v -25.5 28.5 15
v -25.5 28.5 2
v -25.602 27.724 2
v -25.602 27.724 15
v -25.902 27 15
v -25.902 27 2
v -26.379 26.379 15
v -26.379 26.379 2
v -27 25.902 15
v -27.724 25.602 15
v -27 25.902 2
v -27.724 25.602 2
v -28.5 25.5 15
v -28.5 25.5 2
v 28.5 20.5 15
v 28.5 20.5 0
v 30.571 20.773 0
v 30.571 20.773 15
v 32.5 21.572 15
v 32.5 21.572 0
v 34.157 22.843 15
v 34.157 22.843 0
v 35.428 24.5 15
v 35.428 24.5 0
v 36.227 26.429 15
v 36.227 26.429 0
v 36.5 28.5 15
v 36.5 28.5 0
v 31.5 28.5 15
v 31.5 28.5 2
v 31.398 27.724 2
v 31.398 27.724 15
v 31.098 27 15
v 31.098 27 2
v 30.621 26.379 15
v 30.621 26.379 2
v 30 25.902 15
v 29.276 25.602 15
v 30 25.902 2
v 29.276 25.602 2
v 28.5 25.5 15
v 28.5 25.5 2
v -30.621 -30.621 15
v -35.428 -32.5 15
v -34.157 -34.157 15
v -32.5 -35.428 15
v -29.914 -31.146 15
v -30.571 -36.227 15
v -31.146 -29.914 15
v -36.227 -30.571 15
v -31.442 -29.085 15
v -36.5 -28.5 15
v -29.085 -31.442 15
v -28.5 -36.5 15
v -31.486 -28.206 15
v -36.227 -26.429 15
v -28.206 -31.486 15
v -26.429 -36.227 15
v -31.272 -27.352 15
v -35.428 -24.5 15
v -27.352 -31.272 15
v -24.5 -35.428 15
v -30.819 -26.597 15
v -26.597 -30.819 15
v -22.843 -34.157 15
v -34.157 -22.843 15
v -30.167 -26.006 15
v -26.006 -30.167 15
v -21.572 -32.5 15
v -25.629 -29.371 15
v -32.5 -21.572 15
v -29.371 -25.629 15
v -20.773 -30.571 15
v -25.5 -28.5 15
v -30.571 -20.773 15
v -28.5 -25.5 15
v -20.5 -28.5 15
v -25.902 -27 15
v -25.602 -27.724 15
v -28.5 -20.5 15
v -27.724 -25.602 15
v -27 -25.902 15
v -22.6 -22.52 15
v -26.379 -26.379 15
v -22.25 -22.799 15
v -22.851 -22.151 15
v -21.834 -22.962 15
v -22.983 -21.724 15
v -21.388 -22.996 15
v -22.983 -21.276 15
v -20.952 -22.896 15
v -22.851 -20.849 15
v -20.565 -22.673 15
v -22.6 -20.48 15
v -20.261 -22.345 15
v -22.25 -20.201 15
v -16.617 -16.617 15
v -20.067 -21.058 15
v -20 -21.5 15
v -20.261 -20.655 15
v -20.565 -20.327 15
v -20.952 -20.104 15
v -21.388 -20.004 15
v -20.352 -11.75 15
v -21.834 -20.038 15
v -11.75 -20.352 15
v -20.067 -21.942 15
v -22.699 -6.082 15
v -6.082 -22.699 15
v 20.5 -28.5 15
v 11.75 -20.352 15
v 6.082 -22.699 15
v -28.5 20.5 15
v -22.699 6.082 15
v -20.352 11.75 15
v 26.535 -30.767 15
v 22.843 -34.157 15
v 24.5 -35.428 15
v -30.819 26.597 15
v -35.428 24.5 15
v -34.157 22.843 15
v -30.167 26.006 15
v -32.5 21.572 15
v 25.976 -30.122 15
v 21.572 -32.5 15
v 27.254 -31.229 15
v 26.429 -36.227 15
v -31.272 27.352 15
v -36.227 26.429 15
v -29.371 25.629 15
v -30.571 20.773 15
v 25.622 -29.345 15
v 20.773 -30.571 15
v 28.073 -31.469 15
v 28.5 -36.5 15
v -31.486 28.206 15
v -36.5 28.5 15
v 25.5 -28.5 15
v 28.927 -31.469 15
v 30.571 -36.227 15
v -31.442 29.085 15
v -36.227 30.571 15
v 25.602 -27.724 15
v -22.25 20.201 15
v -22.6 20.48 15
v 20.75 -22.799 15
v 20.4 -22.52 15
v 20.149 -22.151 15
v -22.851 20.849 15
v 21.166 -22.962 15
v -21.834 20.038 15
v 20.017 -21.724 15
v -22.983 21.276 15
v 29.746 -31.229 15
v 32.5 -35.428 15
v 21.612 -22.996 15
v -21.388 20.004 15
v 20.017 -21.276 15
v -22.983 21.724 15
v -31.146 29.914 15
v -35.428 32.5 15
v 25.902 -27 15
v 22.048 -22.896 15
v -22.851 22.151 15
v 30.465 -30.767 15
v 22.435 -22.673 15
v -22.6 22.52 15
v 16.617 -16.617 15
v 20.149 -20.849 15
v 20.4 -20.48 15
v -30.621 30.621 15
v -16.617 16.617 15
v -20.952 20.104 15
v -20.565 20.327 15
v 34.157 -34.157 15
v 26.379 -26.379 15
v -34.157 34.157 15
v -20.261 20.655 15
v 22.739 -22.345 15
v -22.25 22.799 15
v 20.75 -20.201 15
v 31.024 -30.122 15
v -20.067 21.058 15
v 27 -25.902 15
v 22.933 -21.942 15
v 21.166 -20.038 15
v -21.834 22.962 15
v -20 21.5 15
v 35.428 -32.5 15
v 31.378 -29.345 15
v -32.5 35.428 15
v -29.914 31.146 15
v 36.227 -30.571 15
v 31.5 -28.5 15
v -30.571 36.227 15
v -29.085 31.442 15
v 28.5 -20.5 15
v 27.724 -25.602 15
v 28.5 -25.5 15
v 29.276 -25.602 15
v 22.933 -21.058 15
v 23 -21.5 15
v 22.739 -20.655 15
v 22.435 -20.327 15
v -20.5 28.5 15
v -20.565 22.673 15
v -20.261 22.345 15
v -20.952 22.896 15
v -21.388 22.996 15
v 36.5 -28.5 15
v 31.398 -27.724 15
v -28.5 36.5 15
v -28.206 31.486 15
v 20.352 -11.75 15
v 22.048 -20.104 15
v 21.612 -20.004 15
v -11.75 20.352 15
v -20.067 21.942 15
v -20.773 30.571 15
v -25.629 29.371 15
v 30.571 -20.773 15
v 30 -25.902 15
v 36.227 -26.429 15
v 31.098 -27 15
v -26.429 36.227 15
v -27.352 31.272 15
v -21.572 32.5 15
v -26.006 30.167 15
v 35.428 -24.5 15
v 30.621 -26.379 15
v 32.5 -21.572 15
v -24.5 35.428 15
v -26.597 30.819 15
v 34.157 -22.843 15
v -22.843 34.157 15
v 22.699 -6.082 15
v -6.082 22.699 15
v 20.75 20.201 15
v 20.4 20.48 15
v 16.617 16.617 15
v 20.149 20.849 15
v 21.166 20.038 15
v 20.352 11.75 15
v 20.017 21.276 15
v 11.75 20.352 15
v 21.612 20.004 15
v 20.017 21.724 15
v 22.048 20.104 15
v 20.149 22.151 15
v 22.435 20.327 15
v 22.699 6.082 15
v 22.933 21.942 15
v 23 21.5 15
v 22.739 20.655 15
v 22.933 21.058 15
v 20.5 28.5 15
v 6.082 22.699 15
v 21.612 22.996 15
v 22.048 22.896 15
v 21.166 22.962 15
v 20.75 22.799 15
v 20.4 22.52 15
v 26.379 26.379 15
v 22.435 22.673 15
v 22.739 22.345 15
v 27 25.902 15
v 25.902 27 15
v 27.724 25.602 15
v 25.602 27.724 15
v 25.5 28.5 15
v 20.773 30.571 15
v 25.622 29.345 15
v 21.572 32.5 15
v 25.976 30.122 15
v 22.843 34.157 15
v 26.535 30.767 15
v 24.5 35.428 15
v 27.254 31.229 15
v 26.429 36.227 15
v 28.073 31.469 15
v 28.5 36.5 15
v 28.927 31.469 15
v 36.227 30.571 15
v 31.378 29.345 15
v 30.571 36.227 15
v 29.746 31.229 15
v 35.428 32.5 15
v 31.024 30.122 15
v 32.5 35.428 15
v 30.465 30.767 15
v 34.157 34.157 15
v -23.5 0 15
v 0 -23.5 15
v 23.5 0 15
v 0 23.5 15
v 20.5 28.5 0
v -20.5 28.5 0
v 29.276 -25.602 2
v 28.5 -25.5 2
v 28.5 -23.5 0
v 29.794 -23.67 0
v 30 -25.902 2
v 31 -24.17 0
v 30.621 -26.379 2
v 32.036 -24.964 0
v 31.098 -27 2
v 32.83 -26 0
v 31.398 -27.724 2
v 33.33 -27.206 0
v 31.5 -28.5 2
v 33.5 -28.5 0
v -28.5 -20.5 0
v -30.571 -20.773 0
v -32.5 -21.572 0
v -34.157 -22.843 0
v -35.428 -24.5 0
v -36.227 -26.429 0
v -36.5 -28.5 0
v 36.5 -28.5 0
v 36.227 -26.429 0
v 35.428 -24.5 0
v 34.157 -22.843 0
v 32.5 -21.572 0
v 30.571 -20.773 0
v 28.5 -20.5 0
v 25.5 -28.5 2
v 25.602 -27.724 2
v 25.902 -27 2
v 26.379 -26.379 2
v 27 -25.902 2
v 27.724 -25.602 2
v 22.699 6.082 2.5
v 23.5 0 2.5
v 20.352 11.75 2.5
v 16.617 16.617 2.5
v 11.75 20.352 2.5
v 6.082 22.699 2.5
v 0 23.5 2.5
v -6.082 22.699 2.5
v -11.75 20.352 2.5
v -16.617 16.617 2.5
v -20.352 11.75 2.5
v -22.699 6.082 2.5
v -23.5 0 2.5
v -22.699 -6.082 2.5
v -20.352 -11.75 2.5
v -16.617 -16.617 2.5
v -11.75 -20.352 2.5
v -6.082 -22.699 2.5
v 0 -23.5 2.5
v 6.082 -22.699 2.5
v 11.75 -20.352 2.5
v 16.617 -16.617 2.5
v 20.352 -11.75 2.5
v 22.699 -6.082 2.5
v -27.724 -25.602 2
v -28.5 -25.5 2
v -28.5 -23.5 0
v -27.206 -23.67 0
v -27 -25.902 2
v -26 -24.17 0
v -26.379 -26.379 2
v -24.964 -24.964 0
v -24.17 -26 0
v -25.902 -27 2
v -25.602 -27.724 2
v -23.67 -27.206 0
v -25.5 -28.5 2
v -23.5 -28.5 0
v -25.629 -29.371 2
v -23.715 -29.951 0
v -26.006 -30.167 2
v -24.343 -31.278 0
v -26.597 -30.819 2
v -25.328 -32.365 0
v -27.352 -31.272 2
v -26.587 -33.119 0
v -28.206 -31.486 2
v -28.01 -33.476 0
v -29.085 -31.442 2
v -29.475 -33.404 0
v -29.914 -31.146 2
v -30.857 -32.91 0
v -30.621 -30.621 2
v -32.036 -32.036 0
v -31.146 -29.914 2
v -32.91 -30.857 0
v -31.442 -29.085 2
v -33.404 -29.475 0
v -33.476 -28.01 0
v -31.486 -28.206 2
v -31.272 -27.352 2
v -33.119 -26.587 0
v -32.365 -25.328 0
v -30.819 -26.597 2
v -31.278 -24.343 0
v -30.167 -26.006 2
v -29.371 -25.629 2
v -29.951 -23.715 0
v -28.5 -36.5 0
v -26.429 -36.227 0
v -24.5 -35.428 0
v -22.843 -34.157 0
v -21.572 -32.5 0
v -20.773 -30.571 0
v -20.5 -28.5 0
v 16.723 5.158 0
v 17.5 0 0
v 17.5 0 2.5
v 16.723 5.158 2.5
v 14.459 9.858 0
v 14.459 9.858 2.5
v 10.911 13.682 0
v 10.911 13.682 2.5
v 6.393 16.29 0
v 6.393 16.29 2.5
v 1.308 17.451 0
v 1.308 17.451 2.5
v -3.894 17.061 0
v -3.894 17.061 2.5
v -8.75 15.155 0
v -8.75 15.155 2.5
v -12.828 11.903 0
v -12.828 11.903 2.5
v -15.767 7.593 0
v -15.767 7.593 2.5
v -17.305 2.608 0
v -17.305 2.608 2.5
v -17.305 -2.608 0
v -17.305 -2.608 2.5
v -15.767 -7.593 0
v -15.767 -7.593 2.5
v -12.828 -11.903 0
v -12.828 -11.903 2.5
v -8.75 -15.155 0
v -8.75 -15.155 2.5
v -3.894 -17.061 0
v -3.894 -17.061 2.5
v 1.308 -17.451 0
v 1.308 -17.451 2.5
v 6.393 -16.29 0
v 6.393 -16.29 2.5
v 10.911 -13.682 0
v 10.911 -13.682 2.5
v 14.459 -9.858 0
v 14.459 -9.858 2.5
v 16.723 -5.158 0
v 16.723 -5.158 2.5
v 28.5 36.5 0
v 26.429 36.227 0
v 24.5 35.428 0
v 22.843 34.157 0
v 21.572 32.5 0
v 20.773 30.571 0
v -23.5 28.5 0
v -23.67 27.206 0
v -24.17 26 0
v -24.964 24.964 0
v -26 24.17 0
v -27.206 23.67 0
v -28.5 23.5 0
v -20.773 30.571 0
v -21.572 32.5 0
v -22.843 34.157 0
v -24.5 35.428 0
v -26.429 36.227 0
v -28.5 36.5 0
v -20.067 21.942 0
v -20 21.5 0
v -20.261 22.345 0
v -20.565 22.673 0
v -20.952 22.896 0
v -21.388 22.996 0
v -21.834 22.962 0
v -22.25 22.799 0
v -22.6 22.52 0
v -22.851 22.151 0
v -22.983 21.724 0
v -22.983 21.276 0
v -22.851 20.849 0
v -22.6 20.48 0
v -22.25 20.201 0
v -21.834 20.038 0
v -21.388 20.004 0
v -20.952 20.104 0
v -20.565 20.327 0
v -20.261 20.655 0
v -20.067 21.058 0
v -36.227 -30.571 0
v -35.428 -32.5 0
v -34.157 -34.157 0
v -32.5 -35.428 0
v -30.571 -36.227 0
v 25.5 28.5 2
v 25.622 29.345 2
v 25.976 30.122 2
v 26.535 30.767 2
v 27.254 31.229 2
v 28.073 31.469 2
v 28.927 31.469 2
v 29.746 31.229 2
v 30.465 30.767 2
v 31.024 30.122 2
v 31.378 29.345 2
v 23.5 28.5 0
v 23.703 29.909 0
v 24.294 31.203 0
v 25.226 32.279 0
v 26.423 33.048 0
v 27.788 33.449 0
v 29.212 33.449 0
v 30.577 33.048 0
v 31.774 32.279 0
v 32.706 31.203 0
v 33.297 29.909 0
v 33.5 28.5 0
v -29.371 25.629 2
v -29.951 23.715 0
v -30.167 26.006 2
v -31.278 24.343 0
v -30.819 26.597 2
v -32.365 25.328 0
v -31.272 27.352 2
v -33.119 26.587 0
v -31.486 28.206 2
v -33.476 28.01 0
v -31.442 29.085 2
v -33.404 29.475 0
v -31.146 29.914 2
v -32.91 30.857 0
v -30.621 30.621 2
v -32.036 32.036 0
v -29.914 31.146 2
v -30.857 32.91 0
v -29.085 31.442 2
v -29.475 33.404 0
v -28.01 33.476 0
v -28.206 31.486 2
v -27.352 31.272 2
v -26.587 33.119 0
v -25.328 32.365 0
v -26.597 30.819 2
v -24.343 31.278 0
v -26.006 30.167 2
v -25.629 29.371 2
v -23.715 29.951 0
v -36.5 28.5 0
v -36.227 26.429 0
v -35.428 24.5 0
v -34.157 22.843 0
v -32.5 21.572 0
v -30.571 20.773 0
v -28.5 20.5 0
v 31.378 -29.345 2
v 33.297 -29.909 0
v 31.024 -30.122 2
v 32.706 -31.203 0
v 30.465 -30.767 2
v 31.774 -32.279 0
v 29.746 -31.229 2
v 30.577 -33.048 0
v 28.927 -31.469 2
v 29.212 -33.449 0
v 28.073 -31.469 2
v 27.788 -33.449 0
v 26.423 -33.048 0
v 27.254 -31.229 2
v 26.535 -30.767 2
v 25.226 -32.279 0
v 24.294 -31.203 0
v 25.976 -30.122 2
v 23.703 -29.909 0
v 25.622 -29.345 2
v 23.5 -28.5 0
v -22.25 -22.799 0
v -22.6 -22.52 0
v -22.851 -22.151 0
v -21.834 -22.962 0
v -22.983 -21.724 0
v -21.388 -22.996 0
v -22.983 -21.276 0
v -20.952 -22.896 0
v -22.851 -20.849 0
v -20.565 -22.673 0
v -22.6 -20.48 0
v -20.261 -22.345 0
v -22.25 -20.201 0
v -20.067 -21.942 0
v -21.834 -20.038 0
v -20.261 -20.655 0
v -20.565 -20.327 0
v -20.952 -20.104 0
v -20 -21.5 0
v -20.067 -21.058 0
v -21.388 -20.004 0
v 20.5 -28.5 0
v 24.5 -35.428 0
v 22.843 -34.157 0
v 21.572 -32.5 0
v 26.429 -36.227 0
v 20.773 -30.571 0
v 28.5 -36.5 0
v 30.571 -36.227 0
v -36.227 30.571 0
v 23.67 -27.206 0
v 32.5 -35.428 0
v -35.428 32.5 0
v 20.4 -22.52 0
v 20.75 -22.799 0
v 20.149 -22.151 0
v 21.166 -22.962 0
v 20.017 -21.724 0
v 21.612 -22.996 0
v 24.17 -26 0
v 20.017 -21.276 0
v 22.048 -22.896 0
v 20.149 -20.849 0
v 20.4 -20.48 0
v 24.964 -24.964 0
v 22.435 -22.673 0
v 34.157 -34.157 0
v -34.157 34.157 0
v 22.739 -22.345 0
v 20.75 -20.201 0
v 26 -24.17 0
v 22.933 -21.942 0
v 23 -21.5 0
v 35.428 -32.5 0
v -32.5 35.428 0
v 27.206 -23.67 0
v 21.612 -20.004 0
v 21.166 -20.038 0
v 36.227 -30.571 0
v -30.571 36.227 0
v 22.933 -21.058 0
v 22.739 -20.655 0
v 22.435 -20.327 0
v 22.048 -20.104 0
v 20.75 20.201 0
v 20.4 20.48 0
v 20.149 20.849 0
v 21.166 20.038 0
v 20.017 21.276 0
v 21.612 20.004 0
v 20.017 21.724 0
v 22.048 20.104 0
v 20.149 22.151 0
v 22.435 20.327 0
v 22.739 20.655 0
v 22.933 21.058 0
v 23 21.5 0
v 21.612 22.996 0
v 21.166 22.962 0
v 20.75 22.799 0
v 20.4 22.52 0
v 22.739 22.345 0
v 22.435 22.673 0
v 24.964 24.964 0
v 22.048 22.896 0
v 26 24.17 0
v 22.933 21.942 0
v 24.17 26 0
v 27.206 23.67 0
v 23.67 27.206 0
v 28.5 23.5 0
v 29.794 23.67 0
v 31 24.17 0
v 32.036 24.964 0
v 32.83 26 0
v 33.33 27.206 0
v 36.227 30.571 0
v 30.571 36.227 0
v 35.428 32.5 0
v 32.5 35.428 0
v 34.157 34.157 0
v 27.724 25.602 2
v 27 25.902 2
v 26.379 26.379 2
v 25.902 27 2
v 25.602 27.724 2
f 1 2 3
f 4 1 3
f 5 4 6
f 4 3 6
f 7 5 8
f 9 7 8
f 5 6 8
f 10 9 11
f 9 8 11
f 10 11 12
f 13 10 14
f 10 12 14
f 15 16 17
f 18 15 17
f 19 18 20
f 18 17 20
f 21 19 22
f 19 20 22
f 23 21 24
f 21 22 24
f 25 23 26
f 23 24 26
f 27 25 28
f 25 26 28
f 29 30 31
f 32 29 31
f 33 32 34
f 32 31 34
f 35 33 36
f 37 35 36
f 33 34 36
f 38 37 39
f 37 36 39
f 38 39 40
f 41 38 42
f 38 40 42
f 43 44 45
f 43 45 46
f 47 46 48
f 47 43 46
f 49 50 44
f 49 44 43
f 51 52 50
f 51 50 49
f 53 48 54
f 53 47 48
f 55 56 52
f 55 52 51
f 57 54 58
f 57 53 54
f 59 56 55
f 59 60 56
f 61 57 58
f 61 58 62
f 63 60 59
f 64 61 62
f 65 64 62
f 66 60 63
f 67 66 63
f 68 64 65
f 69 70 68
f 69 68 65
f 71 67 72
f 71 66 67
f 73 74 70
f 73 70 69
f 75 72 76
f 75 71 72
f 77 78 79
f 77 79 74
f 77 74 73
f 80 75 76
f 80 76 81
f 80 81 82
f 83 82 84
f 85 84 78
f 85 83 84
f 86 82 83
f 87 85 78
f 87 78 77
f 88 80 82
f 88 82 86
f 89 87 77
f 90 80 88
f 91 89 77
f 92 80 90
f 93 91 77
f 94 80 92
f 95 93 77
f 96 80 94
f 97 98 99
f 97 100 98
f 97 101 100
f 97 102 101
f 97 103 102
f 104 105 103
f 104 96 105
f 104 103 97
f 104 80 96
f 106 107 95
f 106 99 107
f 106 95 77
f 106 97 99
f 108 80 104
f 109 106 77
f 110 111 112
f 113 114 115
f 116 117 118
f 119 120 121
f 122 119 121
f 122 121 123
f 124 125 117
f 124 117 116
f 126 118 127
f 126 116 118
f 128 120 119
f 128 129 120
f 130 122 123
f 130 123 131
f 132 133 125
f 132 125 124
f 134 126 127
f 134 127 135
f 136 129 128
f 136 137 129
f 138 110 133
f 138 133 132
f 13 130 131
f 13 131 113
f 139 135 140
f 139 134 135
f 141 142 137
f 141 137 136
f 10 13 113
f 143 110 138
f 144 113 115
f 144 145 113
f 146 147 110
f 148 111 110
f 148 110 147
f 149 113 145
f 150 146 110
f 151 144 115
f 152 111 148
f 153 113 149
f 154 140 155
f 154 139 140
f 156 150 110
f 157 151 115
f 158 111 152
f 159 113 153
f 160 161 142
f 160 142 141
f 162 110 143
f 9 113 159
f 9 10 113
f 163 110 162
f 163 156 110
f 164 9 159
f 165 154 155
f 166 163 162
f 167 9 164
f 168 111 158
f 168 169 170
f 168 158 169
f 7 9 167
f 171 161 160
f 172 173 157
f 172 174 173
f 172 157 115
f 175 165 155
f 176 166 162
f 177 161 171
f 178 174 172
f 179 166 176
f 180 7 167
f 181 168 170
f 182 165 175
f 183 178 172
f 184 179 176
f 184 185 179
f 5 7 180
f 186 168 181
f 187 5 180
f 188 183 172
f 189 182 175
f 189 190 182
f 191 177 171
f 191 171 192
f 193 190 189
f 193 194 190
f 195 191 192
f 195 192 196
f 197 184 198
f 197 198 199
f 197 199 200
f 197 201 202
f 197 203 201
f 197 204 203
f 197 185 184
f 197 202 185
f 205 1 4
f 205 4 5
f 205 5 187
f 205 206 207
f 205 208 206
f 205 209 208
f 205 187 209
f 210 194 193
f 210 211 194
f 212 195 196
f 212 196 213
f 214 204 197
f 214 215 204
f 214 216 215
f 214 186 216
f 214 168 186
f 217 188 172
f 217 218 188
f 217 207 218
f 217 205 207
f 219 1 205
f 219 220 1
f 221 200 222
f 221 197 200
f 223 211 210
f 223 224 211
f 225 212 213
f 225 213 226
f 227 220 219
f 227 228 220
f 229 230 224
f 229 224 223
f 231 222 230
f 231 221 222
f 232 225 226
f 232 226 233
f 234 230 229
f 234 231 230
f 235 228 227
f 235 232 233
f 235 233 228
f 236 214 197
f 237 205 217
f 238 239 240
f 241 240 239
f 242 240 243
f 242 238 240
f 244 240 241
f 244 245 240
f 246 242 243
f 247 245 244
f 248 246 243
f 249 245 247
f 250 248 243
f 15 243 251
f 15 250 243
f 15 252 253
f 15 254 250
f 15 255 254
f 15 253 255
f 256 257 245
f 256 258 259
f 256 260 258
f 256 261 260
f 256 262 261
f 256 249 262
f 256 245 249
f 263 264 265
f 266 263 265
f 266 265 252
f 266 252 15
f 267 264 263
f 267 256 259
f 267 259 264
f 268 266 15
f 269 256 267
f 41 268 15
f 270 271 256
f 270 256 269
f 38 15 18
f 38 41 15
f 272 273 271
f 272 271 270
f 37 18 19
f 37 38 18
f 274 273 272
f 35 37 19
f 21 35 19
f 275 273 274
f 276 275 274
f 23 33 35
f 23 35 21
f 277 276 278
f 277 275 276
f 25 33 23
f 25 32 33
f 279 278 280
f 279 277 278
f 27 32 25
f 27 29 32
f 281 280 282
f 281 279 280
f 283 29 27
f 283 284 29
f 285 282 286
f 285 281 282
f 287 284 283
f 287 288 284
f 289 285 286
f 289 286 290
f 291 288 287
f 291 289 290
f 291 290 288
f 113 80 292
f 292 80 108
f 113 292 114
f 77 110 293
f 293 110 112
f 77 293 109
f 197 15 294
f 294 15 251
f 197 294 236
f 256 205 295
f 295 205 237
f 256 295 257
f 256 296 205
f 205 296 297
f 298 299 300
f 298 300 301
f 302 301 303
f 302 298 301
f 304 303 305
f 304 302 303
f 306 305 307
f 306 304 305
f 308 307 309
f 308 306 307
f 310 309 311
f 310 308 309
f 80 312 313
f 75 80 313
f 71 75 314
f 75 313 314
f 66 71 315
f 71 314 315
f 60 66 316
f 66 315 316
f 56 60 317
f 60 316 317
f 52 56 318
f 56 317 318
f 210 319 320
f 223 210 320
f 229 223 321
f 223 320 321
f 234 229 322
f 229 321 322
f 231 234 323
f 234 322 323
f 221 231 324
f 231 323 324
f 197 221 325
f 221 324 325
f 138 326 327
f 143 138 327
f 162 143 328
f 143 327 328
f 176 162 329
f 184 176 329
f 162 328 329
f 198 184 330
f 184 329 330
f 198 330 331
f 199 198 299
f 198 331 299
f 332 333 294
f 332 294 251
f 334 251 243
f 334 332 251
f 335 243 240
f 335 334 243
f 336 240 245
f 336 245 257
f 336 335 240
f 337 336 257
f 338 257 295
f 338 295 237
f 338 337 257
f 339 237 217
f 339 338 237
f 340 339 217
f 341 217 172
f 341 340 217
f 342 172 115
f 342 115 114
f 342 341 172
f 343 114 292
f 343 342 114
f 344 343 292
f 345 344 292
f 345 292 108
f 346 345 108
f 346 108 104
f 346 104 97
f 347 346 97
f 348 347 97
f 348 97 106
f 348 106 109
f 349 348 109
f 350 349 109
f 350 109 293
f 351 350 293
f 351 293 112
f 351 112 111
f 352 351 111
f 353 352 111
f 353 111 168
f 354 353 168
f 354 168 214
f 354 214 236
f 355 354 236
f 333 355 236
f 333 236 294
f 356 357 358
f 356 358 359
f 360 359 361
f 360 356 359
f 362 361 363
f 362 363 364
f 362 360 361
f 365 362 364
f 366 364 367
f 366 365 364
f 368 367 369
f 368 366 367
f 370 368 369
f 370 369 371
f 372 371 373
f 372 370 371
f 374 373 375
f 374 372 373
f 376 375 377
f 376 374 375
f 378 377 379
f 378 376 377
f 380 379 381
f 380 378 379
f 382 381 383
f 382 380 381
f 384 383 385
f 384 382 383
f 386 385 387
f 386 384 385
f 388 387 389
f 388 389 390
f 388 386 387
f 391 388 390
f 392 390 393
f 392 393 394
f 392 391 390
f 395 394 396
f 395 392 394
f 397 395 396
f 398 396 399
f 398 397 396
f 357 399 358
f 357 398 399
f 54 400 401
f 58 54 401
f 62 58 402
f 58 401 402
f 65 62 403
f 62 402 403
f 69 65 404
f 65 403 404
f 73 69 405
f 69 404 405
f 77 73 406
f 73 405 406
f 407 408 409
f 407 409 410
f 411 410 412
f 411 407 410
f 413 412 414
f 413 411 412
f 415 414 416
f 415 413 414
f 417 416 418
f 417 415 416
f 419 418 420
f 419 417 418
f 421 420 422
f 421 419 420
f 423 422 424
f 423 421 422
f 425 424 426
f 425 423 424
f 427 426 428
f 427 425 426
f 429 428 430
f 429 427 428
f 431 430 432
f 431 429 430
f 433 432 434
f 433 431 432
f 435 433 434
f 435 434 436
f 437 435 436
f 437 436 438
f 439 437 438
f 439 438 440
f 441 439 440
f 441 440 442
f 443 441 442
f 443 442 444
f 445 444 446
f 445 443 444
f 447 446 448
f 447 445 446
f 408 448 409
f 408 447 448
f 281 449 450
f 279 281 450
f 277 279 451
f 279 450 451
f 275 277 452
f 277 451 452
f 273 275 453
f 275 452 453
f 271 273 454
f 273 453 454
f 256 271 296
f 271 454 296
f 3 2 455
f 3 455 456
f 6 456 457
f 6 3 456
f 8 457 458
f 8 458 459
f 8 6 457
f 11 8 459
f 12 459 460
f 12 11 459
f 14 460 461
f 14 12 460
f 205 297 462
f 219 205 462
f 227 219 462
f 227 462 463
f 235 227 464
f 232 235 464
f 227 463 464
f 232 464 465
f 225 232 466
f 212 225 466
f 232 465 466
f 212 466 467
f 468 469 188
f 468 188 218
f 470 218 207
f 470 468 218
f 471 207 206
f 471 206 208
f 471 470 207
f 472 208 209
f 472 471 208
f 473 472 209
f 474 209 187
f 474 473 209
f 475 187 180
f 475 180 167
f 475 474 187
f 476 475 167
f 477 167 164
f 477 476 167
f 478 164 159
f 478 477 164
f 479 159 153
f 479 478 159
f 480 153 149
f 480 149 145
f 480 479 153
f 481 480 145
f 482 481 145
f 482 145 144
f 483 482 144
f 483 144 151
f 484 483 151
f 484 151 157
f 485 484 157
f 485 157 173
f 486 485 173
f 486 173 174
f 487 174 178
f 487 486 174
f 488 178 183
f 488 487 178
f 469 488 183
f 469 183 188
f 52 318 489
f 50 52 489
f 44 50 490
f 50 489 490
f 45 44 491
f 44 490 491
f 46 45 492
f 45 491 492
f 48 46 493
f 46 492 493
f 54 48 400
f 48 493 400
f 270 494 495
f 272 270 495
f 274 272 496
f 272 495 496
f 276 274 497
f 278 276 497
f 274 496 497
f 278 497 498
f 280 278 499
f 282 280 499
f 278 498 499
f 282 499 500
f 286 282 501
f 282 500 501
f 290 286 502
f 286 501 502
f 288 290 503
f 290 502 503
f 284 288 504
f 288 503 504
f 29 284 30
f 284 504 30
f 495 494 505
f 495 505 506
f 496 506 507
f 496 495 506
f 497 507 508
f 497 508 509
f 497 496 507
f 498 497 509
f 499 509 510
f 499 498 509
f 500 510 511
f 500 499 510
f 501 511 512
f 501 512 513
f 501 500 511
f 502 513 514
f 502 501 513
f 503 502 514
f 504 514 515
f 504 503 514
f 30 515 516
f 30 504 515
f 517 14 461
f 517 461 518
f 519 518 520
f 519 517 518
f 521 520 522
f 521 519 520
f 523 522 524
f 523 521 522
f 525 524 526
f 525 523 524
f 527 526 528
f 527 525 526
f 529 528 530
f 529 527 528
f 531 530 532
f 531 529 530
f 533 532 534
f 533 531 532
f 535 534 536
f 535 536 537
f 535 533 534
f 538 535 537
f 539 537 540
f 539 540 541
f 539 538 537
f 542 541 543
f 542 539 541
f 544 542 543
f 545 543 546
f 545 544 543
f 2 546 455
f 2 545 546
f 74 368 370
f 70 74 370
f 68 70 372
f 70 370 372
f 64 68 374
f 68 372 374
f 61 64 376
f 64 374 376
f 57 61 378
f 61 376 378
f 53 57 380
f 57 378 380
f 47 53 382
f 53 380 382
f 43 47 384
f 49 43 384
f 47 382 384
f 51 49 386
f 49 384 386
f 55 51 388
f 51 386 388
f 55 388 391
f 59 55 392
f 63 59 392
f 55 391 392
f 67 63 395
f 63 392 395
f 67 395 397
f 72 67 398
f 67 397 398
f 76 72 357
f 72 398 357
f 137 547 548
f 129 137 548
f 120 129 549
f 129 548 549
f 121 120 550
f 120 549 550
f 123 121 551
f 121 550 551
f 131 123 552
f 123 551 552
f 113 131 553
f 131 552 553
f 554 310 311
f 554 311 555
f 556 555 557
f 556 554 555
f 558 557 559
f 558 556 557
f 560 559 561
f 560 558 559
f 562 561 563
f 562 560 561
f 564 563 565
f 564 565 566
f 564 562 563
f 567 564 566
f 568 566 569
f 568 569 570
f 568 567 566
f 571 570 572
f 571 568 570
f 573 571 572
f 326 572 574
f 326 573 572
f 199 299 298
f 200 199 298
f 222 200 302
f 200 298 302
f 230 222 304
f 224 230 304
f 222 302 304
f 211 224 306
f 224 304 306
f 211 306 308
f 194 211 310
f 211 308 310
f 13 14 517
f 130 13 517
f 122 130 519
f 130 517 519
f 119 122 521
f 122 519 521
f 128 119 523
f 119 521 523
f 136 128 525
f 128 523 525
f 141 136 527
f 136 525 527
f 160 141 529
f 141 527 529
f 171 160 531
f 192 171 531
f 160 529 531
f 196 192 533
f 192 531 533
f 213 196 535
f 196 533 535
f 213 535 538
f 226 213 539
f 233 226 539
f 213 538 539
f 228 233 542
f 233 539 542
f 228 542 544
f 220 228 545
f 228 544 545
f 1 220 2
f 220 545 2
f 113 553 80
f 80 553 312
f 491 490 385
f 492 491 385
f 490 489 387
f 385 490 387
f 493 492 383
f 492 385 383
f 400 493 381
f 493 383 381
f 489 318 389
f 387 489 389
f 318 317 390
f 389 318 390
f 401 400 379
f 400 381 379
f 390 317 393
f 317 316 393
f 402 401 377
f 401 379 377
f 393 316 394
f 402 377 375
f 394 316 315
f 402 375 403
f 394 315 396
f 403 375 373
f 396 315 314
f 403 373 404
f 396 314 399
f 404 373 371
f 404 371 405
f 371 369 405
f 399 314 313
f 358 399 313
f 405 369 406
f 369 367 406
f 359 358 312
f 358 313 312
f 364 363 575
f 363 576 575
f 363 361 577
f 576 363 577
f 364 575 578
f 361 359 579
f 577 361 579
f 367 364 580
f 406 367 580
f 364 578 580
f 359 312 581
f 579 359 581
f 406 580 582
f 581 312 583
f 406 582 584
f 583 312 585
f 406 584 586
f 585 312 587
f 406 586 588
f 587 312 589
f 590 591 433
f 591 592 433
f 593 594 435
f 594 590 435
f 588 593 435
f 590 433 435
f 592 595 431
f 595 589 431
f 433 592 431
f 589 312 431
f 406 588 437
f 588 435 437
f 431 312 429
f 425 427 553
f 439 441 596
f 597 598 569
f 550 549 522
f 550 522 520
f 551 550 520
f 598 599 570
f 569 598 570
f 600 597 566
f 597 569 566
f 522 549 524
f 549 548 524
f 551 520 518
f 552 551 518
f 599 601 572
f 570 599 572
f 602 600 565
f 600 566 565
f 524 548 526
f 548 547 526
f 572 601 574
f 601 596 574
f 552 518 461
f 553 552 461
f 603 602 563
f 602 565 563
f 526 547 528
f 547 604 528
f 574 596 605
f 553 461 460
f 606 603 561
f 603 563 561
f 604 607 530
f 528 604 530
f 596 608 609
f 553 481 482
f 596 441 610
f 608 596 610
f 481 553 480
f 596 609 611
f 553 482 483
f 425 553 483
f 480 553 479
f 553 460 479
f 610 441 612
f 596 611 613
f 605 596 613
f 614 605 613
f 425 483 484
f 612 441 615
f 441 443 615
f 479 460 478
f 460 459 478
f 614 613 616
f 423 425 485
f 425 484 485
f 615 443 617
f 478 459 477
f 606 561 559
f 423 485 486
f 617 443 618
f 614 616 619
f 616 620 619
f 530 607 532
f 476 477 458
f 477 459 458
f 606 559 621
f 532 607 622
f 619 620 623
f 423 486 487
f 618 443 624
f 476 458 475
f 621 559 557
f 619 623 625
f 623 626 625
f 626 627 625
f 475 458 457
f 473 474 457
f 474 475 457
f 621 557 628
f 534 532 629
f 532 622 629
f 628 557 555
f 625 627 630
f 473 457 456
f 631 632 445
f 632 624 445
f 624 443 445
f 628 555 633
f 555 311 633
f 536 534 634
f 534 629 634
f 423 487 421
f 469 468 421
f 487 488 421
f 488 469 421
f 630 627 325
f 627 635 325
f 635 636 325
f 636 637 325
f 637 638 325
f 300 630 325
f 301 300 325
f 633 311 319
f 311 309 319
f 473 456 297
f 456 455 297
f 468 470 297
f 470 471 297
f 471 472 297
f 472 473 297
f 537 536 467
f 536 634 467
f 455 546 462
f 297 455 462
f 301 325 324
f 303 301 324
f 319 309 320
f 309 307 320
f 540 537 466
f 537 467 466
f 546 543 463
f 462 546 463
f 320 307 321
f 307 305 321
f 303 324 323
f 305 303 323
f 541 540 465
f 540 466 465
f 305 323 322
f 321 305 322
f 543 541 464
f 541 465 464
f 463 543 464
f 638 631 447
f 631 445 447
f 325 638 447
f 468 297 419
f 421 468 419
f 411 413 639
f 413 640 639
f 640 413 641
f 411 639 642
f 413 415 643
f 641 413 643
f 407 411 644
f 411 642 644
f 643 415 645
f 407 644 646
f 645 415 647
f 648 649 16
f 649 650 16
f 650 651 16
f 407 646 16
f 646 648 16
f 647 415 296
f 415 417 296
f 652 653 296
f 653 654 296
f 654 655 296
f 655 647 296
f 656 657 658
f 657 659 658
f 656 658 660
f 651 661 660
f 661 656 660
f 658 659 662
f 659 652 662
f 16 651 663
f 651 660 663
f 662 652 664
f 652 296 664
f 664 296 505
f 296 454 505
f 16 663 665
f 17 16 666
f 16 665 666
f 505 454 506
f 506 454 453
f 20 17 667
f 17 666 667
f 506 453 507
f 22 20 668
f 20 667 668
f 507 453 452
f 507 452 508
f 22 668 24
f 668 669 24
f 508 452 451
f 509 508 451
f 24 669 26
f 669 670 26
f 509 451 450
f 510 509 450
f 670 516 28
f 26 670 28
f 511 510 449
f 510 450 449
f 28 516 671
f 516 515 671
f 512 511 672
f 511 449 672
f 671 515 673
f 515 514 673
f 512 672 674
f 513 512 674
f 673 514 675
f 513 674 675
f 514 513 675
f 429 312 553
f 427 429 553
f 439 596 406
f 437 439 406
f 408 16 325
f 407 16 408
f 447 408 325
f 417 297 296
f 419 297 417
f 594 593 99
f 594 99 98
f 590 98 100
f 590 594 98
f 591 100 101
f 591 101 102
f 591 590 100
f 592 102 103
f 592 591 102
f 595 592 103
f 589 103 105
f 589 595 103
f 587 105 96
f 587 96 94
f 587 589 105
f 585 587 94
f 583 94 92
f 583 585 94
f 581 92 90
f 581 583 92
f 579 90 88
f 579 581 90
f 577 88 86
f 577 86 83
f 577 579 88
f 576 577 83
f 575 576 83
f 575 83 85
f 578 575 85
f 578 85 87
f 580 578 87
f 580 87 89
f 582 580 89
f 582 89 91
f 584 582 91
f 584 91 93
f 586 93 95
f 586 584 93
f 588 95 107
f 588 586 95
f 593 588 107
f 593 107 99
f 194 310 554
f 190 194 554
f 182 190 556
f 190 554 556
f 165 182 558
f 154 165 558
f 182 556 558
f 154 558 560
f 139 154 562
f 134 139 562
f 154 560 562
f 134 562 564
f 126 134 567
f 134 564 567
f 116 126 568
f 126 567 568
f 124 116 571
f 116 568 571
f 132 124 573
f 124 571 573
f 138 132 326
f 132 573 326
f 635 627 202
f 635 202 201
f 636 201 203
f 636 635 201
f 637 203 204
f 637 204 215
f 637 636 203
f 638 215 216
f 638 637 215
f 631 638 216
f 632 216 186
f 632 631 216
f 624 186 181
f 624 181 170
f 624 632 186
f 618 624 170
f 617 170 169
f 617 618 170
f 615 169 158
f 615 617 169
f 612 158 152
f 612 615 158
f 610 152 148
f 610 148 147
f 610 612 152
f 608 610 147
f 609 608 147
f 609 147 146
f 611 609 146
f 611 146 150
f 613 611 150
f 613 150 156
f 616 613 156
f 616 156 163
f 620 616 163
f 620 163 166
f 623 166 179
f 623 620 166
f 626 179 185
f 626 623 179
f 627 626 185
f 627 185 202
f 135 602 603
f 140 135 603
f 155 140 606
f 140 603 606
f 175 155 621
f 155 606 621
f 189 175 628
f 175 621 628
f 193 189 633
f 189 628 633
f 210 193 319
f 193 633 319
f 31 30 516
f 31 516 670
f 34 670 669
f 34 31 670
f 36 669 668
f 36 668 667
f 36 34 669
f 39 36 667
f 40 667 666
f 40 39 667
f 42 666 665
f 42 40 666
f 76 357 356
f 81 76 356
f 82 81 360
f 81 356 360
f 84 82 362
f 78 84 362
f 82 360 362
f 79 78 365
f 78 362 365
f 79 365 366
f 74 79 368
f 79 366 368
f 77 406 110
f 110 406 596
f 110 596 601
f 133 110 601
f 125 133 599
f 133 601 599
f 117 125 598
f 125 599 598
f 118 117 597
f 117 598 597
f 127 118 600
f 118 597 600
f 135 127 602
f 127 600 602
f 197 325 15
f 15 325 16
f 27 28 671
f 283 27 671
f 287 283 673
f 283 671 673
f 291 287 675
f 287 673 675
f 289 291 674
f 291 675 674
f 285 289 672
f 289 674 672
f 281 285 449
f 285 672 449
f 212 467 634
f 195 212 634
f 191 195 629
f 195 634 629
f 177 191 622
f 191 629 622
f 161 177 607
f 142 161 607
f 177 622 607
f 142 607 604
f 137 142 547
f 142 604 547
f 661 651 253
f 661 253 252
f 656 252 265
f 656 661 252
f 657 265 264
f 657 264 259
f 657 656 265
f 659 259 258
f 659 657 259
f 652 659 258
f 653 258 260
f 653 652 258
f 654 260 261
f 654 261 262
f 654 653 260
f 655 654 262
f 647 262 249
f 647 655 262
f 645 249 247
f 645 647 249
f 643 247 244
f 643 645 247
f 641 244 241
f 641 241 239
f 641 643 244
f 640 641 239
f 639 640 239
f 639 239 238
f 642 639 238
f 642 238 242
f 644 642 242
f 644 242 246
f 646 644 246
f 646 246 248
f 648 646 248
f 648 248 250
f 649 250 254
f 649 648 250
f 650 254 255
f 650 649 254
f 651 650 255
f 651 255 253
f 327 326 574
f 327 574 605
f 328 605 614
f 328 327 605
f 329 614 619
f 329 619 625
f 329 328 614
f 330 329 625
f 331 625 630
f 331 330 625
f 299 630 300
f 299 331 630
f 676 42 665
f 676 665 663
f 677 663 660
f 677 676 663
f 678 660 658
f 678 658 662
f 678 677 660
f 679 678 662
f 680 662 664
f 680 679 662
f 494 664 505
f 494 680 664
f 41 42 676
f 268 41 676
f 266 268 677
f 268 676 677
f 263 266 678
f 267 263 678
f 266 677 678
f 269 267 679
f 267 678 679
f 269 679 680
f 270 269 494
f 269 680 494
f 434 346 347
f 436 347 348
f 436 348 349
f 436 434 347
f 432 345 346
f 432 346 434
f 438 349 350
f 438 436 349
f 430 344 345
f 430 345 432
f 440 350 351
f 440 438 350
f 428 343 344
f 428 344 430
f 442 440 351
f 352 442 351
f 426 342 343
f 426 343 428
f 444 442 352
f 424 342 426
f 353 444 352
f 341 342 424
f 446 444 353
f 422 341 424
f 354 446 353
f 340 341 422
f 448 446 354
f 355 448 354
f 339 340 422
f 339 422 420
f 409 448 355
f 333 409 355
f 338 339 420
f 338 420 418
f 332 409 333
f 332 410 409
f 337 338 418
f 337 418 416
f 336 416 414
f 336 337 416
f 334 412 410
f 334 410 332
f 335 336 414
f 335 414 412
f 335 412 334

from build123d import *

# Parameters (mm, degrees)
F0_R     = 1.5
F0_R_2   = 23.5
F1_DEPTH = 15
F0_R_3   = 17.5
F2_DEPTH = 2.5
F3_SIZE  = 2


# Not quite as in the source:
# - a feature names something its author has since deleted; it is built from what else it names


with BuildPart() as f1:
    # F0 (on Top) → F1 (new body)
    with BuildSketch(Plane.XY):
        with BuildLine():
            Line((-28.5, 25.5), (-28.5, 20.5))
            ThreePointArc((-28.5, 20.5), (-22.8431457505, 22.8431457505), (-20.5, 28.5))
            Line((-20.5, 28.5), (-25.5, 28.5))
            ThreePointArc((-25.5, 28.5), (-26.3786796564, 26.3786796564), (-28.5, 25.5))
        make_face()
        with BuildLine():
            Line((-20.5, -28.5), (20.5, -28.5))
            ThreePointArc((20.5, -28.5), (22.8431457505, -22.8431457505), (28.5, -20.5))
            Line((28.5, -20.5), (28.5, 20.5))
            ThreePointArc((28.5, 20.5), (22.8431457505, 22.8431457505), (20.5, 28.5))
            Line((20.5, 28.5), (-20.5, 28.5))
            ThreePointArc((-20.5, 28.5), (-22.8431457505, 22.8431457505), (-28.5, 20.5))
            Line((-28.5, 20.5), (-28.5, -20.5))
            ThreePointArc((-28.5, -20.5), (-22.8431457505, -22.8431457505), (-20.5, -28.5))
        make_face()
        with Locations((-21.5, -21.5)):
            Circle(F0_R, mode=Mode.SUBTRACT)
        with Locations((21.5, -21.5)):
            Circle(F0_R, mode=Mode.SUBTRACT)
        with Locations((-21.5, 21.5)):
            Circle(F0_R, mode=Mode.SUBTRACT)
        Circle(F0_R_2, mode=Mode.SUBTRACT)
        with Locations((21.5, 21.5)):
            Circle(F0_R, mode=Mode.SUBTRACT)
        with BuildLine():
            ThreePointArc((20.5, 28.5), (22.8431457505, 22.8431457505), (28.5, 20.5))
            Line((28.5, 20.5), (28.5, 25.5))
            ThreePointArc((28.5, 25.5), (26.3786796564, 26.3786796564), (25.5, 28.5))
            Line((25.5, 28.5), (20.5, 28.5))
        make_face()
        with BuildLine():
            ThreePointArc((28.5, 20.5), (34.1568542495, 22.8431457505), (36.5, 28.5))
            ThreePointArc((36.5, 28.5), (34.1568542495, 34.1568542495), (28.5, 36.5))
            ThreePointArc((28.5, 36.5), (22.8431457505, 34.1568542495), (20.5, 28.5))
            Line((20.5, 28.5), (25.5, 28.5))
            ThreePointArc((25.5, 28.5), (28.5, 31.5), (31.5, 28.5))
            ThreePointArc((31.5, 28.5), (30.6213203436, 26.3786796564), (28.5, 25.5))
            Line((28.5, 25.5), (28.5, 20.5))
        make_face()
        with BuildLine():
            ThreePointArc((20.5, -28.5), (22.8431457505, -34.1568542495), (28.5, -36.5))
            ThreePointArc((28.5, -36.5), (34.1568542495, -34.1568542495), (36.5, -28.5))
            ThreePointArc((36.5, -28.5), (34.1568542495, -22.8431457505), (28.5, -20.5))
            Line((28.5, -20.5), (28.5, -25.5))
            ThreePointArc((28.5, -25.5), (30.6213203436, -26.3786796564), (31.5, -28.5))
            ThreePointArc((31.5, -28.5), (28.5, -31.5), (25.5, -28.5))
            Line((25.5, -28.5), (20.5, -28.5))
        make_face()
        with BuildLine():
            ThreePointArc((28.5, -20.5), (22.8431457505, -22.8431457505), (20.5, -28.5))
            Line((20.5, -28.5), (25.5, -28.5))
            ThreePointArc((25.5, -28.5), (26.3786796564, -26.3786796564), (28.5, -25.5))
            Line((28.5, -25.5), (28.5, -20.5))
        make_face()
        with BuildLine():
            Line((-25.5, -28.5), (-20.5, -28.5))
            ThreePointArc((-20.5, -28.5), (-22.8431457505, -22.8431457505), (-28.5, -20.5))
            Line((-28.5, -20.5), (-28.5, -25.5))
            ThreePointArc((-28.5, -25.5), (-26.3786796564, -26.3786796564), (-25.5, -28.5))
        make_face()
        with BuildLine():
            ThreePointArc((-36.5, -28.5), (-34.1568542495, -34.1568542495), (-28.5, -36.5))
            ThreePointArc((-28.5, -36.5), (-22.8431457505, -34.1568542495), (-20.5, -28.5))
            Line((-20.5, -28.5), (-25.5, -28.5))
            ThreePointArc((-25.5, -28.5), (-30.6213203436, -30.6213203436), (-28.5, -25.5))
            Line((-28.5, -25.5), (-28.5, -20.5))
            ThreePointArc((-28.5, -20.5), (-34.1568542495, -22.8431457505), (-36.5, -28.5))
        make_face()
        with BuildLine():
            ThreePointArc((-28.4999999613, 36.5), (-34.1568542358, 34.1568542632), (-36.5, 28.5))
            ThreePointArc((-36.5, 28.5), (-34.1568542495, 22.8431457505), (-28.5, 20.5))
            Line((-28.5, 20.5), (-28.5, 25.5))
            ThreePointArc((-28.5, 25.5), (-30.6213203436, 30.6213203436), (-25.5, 28.5))
            Line((-25.5, 28.5), (-20.5, 28.5))
            ThreePointArc((-20.5, 28.5), (-22.8431457368, 34.1568542358), (-28.4999999613, 36.5))
        make_face()
    extrude(amount=F1_DEPTH)

    # F0 (on Top) → F2 (join)
    with BuildSketch(Plane.XY):
        Circle(F0_R_2)
        Circle(F0_R_3, mode=Mode.SUBTRACT)
    extrude(amount=F2_DEPTH)

    # F3
    f3_edges = [f1.edges().sort_by_distance(p)[0] for p in [
        (31.5, 28.5, 0),
        (-28.5, 31.5, 0),
        (-31.5, -28.5, 0),
        (28.5, -31.5, 0),
    ]]
    chamfer(f3_edges, length=F3_SIZE)


solid = f1.part
